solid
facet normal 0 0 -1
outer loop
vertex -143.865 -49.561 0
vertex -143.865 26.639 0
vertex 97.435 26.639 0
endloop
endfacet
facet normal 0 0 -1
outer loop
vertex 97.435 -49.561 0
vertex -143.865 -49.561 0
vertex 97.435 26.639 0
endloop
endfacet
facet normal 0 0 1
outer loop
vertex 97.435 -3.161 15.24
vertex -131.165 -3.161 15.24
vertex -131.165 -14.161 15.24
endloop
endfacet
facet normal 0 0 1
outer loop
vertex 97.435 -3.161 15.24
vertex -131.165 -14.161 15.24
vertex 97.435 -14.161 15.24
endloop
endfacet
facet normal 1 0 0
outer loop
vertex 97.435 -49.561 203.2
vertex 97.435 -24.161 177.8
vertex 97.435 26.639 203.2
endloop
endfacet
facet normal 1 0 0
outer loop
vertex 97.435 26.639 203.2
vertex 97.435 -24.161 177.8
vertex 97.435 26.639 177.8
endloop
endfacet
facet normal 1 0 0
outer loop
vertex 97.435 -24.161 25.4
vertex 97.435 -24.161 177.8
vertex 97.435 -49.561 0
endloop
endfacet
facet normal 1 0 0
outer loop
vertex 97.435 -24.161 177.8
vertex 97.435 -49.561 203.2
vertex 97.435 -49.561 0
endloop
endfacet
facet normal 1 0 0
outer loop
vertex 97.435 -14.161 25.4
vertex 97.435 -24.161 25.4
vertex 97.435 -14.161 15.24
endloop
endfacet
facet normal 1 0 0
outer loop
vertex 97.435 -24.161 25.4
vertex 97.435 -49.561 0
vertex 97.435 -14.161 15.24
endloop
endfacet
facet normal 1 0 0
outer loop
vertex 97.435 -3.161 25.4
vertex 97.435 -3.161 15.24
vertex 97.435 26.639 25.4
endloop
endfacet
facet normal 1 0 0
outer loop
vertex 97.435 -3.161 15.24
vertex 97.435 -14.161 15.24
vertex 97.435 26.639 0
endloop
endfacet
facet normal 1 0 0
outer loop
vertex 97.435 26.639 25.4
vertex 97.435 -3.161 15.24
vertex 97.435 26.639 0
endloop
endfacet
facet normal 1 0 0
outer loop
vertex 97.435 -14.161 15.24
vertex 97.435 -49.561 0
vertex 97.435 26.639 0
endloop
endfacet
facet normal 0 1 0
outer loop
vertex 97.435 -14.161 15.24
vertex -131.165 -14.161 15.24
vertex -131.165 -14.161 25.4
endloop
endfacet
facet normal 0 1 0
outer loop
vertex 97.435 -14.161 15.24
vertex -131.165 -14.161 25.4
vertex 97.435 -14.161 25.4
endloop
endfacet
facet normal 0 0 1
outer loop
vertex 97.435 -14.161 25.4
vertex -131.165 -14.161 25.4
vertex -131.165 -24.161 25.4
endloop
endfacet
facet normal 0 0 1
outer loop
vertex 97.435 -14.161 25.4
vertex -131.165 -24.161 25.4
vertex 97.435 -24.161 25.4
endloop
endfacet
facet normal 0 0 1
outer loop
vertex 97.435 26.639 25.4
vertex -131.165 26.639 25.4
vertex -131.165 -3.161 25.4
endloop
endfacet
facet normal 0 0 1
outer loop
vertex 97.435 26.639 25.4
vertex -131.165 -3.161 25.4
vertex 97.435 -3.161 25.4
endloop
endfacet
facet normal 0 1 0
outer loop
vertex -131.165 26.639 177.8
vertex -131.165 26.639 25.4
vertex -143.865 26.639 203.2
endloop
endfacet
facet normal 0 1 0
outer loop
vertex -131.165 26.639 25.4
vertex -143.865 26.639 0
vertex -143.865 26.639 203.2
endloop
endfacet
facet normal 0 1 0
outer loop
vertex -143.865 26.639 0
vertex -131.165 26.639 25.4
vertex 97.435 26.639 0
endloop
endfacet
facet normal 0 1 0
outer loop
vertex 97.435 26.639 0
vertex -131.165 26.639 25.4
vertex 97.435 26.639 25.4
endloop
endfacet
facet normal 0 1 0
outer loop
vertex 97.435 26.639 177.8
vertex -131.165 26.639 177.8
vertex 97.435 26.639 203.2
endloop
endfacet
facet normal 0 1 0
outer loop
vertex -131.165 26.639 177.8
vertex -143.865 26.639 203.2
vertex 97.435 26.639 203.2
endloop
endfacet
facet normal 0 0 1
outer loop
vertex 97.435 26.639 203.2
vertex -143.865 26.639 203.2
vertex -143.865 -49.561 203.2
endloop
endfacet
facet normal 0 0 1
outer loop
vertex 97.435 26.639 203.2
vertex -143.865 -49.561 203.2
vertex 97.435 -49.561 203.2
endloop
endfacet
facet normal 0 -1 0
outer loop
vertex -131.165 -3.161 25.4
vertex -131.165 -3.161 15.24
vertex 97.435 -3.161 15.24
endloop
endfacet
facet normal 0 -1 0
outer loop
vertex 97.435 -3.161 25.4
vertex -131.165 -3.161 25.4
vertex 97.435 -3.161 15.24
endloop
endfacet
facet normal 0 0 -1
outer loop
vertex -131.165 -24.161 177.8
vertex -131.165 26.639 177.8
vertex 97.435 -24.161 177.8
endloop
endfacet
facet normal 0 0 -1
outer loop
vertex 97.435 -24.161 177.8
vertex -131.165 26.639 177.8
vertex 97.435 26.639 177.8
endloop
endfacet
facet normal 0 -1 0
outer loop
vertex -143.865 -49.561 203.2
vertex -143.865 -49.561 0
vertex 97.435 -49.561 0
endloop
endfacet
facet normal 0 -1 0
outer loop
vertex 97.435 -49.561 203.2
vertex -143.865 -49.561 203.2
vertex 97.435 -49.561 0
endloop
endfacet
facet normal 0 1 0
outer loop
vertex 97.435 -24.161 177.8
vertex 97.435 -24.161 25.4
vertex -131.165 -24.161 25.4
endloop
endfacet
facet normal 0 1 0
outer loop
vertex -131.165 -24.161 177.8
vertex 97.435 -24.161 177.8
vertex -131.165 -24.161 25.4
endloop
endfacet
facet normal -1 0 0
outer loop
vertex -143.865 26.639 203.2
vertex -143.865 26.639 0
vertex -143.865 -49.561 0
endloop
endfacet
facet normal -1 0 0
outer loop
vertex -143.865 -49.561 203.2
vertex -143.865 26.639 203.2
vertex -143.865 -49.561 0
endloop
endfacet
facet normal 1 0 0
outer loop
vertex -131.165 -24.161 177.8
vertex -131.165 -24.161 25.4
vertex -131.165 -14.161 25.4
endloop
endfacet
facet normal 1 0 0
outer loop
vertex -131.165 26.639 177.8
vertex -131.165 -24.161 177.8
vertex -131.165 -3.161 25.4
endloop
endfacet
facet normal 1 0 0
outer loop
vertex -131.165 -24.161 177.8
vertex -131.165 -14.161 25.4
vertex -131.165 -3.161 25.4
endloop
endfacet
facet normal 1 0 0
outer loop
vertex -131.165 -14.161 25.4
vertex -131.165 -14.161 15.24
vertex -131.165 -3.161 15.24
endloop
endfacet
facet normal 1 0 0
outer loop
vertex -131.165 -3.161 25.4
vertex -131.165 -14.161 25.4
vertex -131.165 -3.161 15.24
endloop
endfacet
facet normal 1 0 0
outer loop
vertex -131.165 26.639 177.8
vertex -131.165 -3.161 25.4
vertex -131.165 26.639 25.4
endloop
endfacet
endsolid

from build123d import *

# Parameters (mm, degrees)
F1_DEPTH = 203.2
F0_W     = 228.6
F0_H     = 10
F2_DEPTH = 25.4
F0_H_2   = 29.8
F0_H_3   = 11
F3_DEPTH = 15.24
F4_W     = 228.6
F4_H     = 50.8
F5_DEPTH = 25.4
F6_W     = 33.1639014184
F6_H     = 23.3497917652
F7_DEPTH = 25.4
F8_W     = 231.14
F8_H     = 60.0164352887
F9_DEPTH = 0.254


# Not quite as in the source:
# - a feature names something its author has since deleted; it is built from what else it names


with BuildPart() as f1:
    # F0 (on Top) → F1 (new body)
    with BuildSketch(Plane.XY):
        Polygon((-143.864646554, -49.5614223182), (97.435353446, -49.5614223182), (97.435353446, -24.1614223182), (-131.164646554, -24.1614223182), (-131.164646554, -14.1614223182), (-131.164646554, -3.1614223182), (-131.164646554, 26.6385776818), (-143.864646554, 26.6385776818), align=None)
    extrude(amount=F1_DEPTH)

    # F4 (on face) → F5 (join)
    with BuildSketch(Plane.XY.offset(203.2)):
        with Locations((-16.864646554, 1.2385776818)):
            Rectangle(F4_W, F4_H)
    extrude(amount=-F5_DEPTH)



with BuildPart() as f2:
    # F0 (on Top) → F2 (new body)
    with BuildSketch(Plane.XY):
        with Locations((-16.864646554, -19.1614223182)):
            Rectangle(F0_W, F0_H)
    extrude(amount=F2_DEPTH)


with BuildPart() as f2b:
    # F0 (on Top) → F2, piece 2 (new body)
    with BuildSketch(Plane.XY):
        with Locations((-16.864646554, 11.7385776818)):
            Rectangle(F0_W, F0_H_2)
    extrude(amount=F2_DEPTH)


with BuildPart() as f3:
    # F0 (on Top) → F3 (new body)
    with BuildSketch(Plane.XY):
        with Locations((-16.864646554, -8.6614223182)):
            Rectangle(F0_W, F0_H_3)
    extrude(amount=F3_DEPTH)


with BuildPart() as f1_1:
    add(f1.part)

    add(f2.part)  # F7 merges F2
    # F6 (on face) → F7 (join)
    with BuildSketch(Plane.YZ.offset(97.435353446)):
        with Locations((-32.979471609, 11.6748958826)):
            Rectangle(F6_W, F6_H)
    extrude(amount=-F7_DEPTH)


    add(f2b.part)  # F9 merges F2b

    add(f3.part)  # F9 merges F3
    # F8 (on face) → F9 (join)
    with BuildSketch(Plane(origin=(0, 0, 0), x_dir=(1, 0, 0), z_dir=(0, 0, -1))):
        with Locations((-18.134646554, 3.3696399626)):
            Rectangle(F8_W, F8_H)
    extrude(amount=-F9_DEPTH)


solid = f1_1.part
